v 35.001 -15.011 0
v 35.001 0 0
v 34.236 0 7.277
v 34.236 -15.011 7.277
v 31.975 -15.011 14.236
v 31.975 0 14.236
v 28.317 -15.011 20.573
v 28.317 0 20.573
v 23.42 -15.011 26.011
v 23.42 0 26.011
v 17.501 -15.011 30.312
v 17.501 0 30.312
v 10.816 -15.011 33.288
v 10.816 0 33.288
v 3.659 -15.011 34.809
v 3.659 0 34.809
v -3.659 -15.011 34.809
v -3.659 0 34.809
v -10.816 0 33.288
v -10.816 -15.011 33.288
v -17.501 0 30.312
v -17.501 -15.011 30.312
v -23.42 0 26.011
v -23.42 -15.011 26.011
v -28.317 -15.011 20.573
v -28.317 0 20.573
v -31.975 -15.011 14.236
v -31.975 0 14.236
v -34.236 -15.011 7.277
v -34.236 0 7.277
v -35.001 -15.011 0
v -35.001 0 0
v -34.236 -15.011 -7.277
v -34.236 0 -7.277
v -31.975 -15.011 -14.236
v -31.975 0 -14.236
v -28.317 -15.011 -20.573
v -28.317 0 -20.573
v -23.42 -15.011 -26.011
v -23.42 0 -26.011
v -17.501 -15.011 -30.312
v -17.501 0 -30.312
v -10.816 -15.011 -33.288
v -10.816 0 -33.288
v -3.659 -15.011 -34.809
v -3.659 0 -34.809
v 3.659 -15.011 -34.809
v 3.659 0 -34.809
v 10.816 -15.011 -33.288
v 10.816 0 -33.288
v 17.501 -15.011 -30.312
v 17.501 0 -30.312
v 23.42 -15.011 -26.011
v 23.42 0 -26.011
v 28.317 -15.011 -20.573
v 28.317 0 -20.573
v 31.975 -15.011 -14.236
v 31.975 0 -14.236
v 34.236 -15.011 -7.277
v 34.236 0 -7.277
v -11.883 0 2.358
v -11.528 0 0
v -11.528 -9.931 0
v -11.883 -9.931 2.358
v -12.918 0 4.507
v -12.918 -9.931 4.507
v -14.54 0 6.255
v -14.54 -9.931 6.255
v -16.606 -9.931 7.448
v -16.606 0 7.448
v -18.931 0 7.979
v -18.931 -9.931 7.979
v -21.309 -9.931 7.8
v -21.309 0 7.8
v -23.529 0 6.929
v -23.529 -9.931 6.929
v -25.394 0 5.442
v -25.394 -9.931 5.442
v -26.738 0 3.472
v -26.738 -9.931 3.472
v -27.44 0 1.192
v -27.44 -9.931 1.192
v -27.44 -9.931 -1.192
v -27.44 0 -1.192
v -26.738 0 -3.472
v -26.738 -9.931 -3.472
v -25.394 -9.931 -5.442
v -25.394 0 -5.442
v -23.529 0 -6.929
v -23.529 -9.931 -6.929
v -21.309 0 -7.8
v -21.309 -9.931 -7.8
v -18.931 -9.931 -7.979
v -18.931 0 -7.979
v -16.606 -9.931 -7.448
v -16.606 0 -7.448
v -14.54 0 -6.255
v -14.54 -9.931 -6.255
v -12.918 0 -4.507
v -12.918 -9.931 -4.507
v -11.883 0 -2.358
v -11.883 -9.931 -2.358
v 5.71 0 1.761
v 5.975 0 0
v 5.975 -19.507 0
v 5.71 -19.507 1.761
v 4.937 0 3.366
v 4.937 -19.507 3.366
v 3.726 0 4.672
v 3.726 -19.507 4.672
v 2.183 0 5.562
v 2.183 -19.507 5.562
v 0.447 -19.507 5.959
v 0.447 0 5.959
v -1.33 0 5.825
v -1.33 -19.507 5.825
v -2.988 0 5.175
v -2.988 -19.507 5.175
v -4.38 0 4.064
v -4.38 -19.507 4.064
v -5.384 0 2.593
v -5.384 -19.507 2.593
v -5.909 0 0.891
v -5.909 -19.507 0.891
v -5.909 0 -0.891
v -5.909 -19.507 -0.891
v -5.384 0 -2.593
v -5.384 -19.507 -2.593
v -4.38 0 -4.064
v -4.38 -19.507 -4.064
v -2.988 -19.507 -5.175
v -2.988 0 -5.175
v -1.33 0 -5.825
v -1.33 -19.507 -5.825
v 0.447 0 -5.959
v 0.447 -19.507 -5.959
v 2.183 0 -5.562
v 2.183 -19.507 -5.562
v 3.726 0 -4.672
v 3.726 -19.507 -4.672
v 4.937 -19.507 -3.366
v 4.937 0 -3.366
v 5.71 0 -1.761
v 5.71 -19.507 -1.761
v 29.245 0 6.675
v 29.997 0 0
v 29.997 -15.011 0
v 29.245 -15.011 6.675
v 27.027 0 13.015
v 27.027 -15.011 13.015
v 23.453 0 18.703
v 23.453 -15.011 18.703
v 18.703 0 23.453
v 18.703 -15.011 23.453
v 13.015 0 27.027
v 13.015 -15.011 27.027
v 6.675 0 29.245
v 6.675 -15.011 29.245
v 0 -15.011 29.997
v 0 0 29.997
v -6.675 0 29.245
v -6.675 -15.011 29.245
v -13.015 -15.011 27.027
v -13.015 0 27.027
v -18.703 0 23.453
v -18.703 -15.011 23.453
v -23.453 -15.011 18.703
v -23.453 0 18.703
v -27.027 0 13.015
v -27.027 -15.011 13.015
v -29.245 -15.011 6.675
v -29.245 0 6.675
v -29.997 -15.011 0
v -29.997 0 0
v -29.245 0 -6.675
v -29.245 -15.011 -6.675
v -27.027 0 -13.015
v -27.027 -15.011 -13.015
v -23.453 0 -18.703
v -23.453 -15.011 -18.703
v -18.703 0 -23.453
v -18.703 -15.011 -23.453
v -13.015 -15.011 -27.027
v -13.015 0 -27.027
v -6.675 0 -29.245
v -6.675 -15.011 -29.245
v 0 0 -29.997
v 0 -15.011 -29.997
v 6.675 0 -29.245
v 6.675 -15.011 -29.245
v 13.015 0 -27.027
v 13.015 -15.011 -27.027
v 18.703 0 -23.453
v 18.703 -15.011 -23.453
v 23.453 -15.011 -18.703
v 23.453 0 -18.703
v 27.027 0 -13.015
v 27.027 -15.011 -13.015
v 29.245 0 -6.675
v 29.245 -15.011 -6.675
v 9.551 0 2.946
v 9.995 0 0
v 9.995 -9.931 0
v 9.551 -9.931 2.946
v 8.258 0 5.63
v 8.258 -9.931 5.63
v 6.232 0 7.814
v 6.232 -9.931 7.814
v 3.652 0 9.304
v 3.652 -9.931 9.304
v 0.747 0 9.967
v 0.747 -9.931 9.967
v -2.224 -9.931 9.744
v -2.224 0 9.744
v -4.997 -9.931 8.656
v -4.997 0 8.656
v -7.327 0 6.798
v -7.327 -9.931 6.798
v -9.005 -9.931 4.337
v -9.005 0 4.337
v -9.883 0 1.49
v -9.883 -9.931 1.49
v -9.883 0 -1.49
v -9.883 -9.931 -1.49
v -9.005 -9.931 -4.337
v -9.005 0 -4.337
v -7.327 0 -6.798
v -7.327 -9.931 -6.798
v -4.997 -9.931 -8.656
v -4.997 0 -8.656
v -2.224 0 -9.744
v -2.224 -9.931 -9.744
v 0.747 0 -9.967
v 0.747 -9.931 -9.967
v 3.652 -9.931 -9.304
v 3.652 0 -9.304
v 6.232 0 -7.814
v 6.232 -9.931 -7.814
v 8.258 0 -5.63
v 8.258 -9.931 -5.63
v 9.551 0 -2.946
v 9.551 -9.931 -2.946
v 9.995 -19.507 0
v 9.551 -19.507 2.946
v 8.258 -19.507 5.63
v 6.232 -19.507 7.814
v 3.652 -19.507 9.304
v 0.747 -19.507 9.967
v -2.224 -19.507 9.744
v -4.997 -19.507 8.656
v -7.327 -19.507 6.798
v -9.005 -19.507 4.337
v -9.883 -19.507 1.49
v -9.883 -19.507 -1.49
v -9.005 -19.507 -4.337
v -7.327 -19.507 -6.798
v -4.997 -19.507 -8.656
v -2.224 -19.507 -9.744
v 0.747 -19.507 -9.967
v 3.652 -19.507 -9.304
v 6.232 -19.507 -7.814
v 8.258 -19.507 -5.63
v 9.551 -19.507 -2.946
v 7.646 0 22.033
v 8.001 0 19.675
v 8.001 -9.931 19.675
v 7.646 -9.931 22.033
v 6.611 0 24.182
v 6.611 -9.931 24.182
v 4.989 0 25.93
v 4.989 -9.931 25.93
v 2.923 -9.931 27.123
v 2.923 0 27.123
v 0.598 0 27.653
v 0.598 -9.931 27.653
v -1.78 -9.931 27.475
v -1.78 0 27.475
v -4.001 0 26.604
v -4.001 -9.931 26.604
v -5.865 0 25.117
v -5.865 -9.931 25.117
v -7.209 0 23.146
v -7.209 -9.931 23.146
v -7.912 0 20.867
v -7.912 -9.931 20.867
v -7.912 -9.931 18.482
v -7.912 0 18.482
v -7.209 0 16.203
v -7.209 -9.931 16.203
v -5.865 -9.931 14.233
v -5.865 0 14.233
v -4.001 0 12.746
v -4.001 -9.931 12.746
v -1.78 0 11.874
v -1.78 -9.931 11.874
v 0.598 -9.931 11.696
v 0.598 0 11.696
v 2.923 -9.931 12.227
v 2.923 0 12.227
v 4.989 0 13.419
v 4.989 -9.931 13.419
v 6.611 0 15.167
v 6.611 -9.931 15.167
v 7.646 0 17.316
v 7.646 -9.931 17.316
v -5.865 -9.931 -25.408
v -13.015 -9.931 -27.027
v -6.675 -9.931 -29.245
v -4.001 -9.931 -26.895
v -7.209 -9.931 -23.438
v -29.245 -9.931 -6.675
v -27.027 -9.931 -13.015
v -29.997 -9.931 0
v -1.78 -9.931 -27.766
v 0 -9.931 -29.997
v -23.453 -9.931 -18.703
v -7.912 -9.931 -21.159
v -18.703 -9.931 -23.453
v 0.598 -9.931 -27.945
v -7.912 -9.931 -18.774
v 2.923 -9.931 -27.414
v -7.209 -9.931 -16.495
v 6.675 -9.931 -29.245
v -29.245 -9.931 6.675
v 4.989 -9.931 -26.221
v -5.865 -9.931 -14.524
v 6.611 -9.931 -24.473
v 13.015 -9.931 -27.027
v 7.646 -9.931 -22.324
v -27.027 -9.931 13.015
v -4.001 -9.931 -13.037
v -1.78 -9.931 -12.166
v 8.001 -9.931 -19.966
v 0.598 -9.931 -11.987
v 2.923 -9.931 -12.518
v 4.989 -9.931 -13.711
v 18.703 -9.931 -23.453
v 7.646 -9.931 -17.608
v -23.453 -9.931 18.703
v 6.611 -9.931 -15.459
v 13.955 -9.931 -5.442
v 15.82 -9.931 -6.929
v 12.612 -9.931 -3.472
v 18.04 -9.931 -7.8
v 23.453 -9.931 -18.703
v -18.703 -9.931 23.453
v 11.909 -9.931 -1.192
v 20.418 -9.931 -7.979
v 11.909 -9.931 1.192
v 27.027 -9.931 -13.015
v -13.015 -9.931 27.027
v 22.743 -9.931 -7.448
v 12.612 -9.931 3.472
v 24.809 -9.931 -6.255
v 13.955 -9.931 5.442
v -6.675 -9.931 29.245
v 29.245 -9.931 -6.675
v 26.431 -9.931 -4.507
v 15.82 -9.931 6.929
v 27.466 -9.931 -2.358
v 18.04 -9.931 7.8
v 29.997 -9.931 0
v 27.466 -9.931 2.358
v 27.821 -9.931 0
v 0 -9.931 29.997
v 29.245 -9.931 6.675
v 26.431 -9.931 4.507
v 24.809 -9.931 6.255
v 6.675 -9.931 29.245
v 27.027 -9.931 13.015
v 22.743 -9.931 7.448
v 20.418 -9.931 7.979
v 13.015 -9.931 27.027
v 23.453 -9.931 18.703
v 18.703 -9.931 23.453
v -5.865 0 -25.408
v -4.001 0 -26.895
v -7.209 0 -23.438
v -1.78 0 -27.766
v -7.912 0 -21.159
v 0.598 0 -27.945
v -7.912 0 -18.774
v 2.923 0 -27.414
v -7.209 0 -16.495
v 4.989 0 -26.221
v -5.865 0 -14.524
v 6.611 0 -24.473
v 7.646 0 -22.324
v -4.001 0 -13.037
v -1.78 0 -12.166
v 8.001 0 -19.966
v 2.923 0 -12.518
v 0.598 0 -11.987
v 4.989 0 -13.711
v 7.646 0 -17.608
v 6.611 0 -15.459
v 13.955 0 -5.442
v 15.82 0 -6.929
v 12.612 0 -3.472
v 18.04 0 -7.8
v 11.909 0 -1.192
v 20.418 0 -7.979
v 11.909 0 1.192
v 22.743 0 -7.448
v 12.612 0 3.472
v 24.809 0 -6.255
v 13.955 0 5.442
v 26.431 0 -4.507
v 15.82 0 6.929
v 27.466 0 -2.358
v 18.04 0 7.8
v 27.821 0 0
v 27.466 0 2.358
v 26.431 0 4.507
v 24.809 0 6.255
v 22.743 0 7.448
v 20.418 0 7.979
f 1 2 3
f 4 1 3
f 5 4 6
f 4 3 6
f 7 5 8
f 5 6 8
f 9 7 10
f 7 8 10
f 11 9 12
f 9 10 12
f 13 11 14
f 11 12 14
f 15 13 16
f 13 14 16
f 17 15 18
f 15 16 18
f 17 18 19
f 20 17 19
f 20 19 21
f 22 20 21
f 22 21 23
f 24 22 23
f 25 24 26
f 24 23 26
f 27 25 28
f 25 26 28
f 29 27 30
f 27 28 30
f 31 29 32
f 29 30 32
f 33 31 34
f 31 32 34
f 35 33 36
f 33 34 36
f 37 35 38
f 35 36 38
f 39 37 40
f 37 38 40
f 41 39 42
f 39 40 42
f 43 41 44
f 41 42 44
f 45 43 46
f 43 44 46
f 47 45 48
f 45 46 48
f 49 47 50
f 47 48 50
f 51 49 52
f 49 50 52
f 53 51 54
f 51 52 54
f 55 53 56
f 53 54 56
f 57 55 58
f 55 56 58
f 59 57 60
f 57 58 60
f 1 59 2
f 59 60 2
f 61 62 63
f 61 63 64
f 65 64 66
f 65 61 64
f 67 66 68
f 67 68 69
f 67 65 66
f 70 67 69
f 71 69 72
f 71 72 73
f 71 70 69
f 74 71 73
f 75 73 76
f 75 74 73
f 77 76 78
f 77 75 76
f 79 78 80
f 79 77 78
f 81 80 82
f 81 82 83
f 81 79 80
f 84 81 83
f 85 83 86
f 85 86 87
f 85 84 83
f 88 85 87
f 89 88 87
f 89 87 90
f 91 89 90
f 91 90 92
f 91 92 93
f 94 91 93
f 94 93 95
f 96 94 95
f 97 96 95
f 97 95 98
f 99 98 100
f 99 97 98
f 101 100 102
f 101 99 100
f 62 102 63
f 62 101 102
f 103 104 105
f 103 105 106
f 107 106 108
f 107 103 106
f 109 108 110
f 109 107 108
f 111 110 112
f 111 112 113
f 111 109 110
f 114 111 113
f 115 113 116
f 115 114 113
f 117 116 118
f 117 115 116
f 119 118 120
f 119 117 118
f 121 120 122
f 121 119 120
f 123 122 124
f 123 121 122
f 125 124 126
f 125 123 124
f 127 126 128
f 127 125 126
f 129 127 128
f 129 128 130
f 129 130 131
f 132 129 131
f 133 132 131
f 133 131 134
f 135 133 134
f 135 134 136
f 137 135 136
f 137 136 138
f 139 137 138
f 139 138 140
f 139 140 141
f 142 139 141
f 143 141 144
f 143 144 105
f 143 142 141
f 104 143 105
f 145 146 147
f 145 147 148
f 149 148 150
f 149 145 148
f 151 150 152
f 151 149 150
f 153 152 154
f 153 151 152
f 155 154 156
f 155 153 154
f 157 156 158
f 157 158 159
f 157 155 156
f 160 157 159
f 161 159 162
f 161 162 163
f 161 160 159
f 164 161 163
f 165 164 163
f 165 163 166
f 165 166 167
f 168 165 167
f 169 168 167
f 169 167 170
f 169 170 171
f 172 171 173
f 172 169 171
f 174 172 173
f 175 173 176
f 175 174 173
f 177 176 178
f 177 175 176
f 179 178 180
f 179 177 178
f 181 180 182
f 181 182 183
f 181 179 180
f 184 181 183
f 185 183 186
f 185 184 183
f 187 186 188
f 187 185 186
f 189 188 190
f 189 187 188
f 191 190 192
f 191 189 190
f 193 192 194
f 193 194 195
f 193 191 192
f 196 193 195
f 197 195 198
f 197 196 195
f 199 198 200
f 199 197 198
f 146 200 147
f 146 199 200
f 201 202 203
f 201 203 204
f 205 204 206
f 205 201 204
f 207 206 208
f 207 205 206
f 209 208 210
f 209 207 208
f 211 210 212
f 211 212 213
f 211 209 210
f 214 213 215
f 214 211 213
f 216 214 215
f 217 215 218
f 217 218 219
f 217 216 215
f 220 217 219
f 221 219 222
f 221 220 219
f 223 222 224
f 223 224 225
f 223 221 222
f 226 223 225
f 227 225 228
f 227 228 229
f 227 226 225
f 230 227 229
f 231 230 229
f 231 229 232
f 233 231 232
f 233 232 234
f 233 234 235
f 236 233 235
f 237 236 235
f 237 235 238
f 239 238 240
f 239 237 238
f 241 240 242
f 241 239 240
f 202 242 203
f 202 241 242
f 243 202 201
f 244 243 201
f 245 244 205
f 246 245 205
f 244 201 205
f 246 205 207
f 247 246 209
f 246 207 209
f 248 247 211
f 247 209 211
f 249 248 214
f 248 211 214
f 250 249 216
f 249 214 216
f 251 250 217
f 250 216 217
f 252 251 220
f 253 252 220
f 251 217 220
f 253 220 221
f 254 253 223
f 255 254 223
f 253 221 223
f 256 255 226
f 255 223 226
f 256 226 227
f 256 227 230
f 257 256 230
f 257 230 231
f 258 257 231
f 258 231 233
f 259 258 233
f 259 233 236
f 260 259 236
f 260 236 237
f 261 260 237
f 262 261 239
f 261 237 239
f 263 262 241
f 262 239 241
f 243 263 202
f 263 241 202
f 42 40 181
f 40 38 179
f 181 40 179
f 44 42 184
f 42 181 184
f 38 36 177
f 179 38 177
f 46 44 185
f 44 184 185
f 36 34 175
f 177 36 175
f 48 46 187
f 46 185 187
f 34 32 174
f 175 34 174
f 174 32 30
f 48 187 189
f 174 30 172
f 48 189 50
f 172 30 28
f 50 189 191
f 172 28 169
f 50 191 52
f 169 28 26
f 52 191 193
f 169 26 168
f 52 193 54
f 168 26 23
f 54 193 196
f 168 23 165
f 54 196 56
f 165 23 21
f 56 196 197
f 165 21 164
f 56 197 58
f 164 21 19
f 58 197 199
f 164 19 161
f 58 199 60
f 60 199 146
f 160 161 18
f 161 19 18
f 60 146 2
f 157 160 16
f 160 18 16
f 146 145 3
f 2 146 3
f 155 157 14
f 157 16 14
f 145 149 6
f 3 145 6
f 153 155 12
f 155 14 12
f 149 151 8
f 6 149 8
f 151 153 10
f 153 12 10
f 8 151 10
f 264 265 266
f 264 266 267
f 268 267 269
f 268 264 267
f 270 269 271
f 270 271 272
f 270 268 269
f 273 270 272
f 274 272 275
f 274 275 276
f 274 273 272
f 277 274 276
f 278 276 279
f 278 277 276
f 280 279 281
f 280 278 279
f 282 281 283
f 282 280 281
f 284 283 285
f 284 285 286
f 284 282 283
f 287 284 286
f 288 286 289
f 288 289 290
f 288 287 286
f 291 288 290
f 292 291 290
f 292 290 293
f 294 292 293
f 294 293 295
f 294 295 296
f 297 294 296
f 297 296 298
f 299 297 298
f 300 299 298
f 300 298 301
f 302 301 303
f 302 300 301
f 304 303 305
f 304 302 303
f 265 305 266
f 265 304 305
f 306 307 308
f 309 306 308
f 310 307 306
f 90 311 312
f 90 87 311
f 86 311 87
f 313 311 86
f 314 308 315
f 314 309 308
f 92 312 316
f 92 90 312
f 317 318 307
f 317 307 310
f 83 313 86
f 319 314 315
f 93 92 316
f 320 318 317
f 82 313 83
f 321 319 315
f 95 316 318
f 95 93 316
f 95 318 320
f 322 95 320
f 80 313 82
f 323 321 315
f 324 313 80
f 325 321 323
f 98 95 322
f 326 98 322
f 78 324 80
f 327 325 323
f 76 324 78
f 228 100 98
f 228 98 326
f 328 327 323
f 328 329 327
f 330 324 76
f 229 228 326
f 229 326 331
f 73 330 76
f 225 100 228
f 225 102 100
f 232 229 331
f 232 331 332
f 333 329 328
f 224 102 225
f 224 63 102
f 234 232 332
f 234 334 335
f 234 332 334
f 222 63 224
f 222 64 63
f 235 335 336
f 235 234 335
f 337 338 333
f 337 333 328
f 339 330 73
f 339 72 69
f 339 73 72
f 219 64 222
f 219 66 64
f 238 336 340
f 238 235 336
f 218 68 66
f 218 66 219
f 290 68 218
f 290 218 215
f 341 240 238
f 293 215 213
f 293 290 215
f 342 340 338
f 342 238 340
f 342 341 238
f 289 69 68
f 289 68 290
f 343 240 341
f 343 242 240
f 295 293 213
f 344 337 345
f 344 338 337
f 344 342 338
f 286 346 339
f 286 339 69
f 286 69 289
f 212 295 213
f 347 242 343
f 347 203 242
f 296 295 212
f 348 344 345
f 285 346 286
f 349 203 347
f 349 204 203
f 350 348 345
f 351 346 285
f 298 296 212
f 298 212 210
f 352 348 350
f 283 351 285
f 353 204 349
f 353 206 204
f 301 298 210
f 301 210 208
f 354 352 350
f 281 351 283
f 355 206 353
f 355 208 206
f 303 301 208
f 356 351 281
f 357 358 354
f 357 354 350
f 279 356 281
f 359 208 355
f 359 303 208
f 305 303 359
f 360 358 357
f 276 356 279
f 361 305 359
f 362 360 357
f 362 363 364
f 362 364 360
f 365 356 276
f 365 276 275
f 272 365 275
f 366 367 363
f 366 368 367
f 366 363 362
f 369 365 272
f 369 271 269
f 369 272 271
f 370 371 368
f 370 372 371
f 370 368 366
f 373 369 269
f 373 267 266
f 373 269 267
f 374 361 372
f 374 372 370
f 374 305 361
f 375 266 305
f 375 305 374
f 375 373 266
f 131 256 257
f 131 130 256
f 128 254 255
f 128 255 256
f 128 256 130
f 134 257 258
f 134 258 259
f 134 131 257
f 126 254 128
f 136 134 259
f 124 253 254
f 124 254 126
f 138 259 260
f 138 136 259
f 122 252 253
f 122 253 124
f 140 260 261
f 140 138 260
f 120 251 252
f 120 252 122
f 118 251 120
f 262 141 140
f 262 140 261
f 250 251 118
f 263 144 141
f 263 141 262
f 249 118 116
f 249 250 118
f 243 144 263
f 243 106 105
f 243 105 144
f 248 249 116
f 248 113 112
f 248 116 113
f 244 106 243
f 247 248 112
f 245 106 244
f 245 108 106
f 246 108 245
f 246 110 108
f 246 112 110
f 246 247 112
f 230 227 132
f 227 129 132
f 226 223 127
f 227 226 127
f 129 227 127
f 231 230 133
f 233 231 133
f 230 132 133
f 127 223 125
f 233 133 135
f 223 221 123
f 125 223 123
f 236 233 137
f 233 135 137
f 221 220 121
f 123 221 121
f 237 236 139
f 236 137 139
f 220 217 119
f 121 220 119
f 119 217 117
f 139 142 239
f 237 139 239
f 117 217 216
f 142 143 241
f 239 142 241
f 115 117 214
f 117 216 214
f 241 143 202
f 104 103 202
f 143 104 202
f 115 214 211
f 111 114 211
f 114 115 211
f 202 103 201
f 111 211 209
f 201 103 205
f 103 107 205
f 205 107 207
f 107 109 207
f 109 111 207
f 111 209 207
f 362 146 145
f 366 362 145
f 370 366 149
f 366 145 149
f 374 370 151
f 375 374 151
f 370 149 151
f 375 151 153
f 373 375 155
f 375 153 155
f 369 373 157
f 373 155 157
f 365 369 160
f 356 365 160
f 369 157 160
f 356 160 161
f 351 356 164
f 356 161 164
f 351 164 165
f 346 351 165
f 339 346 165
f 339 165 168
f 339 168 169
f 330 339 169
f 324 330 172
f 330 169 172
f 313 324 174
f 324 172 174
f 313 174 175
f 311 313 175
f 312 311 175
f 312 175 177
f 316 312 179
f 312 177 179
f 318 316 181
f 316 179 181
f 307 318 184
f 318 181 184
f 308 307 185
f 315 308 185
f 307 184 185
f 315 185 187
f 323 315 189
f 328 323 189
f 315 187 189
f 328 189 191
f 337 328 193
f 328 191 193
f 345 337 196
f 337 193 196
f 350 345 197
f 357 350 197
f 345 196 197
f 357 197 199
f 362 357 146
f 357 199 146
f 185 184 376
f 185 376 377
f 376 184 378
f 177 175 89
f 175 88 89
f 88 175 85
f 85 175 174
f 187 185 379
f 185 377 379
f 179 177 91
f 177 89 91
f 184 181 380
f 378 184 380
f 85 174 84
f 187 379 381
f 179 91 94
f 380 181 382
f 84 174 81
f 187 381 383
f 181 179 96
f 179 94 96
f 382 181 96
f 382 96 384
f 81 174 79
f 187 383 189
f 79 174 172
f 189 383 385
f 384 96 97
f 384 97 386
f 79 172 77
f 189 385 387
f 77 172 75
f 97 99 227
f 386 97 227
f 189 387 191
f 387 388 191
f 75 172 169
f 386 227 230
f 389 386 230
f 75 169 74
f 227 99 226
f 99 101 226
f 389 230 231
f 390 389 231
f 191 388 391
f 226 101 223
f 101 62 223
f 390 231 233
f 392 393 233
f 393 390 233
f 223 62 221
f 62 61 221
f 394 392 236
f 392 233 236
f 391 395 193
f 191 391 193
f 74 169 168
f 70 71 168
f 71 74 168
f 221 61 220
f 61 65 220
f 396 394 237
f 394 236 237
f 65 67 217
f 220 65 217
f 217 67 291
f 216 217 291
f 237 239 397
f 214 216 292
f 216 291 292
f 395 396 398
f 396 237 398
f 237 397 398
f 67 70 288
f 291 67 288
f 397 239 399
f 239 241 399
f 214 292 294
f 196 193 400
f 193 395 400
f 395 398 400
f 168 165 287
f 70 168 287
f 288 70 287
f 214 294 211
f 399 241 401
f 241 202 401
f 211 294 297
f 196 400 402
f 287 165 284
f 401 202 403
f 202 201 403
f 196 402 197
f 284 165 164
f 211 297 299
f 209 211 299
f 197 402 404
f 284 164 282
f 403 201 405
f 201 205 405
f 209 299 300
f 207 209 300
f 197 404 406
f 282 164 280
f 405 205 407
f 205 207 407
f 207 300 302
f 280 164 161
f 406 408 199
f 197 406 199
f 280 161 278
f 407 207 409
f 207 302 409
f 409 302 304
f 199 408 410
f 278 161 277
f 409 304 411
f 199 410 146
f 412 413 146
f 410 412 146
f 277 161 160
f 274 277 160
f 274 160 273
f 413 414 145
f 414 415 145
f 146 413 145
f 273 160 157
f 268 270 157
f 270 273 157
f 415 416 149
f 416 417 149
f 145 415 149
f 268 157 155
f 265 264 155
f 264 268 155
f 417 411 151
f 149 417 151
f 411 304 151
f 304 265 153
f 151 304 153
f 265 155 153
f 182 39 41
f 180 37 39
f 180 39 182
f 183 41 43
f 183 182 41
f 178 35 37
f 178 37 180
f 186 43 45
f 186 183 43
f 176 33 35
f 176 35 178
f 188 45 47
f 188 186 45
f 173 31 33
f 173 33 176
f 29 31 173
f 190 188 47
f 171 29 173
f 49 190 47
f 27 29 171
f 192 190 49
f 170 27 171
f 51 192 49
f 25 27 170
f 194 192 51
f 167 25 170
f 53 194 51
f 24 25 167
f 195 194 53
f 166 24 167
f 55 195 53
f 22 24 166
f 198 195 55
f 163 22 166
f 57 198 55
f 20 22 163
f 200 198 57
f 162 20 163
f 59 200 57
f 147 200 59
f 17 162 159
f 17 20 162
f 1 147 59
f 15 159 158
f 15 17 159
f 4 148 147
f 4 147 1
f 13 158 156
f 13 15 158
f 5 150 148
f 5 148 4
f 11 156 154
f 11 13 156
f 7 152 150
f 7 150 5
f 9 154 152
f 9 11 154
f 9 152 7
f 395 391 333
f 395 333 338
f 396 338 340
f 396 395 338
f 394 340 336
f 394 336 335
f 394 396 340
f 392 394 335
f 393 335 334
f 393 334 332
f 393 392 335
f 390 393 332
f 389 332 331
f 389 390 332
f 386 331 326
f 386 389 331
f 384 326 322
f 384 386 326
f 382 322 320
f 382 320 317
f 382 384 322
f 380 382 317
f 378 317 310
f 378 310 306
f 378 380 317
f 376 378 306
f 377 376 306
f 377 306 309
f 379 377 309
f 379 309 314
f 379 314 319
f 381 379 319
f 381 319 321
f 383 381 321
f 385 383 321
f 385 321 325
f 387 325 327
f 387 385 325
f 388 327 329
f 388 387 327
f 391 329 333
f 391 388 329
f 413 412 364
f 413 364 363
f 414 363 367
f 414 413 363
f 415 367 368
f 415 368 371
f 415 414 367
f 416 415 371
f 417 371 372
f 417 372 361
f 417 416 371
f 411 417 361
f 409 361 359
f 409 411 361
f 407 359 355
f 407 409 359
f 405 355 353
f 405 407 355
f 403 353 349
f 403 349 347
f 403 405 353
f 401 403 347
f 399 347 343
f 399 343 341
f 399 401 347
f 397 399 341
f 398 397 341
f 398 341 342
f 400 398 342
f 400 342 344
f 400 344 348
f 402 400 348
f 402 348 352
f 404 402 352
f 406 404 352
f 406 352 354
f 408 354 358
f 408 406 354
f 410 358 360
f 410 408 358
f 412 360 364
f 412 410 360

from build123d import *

# Parameters (mm, degrees)
F0_R     = 35.0012
F0_R_2   = 29.9974
F1_DEPTH = 15.0114
F0_R_3   = 9.9949
F0_R_4   = 5.975246
F2_DEPTH = 19.5072
F0_R_5   = 8.001
F3_DEPTH = 9.9314


with BuildPart() as f1:
    # F0 (on Front) → F1 (new body)
    with BuildSketch(Plane.XZ):
        Circle(F0_R)
        Circle(F0_R_2, mode=Mode.SUBTRACT)
    extrude(amount=F1_DEPTH)


with BuildPart() as f2:
    # F0 (on Front) → F2 (new body)
    with BuildSketch(Plane.XZ):
        Circle(F0_R_3)
        Circle(F0_R_4, mode=Mode.SUBTRACT)
    extrude(amount=F2_DEPTH)


with BuildPart() as f3:
    # F0 (on Front) → F3 (new body)
    with BuildSketch(Plane.XZ):
        Circle(F0_R_2)
        with Locations((0, -19.966066)):
            Circle(F0_R_5, mode=Mode.SUBTRACT)
        with Locations((-19.528853, 0)):
            Circle(F0_R_5, mode=Mode.SUBTRACT)
        Circle(F0_R_3, mode=Mode.SUBTRACT)
        with Locations((19.820329, 0)):
            Circle(F0_R_5, mode=Mode.SUBTRACT)
        with Locations((0, 19.674592)):
            Circle(F0_R_5, mode=Mode.SUBTRACT)
    extrude(amount=F3_DEPTH)


solid = Compound([f1.part, f2.part, f3.part])
